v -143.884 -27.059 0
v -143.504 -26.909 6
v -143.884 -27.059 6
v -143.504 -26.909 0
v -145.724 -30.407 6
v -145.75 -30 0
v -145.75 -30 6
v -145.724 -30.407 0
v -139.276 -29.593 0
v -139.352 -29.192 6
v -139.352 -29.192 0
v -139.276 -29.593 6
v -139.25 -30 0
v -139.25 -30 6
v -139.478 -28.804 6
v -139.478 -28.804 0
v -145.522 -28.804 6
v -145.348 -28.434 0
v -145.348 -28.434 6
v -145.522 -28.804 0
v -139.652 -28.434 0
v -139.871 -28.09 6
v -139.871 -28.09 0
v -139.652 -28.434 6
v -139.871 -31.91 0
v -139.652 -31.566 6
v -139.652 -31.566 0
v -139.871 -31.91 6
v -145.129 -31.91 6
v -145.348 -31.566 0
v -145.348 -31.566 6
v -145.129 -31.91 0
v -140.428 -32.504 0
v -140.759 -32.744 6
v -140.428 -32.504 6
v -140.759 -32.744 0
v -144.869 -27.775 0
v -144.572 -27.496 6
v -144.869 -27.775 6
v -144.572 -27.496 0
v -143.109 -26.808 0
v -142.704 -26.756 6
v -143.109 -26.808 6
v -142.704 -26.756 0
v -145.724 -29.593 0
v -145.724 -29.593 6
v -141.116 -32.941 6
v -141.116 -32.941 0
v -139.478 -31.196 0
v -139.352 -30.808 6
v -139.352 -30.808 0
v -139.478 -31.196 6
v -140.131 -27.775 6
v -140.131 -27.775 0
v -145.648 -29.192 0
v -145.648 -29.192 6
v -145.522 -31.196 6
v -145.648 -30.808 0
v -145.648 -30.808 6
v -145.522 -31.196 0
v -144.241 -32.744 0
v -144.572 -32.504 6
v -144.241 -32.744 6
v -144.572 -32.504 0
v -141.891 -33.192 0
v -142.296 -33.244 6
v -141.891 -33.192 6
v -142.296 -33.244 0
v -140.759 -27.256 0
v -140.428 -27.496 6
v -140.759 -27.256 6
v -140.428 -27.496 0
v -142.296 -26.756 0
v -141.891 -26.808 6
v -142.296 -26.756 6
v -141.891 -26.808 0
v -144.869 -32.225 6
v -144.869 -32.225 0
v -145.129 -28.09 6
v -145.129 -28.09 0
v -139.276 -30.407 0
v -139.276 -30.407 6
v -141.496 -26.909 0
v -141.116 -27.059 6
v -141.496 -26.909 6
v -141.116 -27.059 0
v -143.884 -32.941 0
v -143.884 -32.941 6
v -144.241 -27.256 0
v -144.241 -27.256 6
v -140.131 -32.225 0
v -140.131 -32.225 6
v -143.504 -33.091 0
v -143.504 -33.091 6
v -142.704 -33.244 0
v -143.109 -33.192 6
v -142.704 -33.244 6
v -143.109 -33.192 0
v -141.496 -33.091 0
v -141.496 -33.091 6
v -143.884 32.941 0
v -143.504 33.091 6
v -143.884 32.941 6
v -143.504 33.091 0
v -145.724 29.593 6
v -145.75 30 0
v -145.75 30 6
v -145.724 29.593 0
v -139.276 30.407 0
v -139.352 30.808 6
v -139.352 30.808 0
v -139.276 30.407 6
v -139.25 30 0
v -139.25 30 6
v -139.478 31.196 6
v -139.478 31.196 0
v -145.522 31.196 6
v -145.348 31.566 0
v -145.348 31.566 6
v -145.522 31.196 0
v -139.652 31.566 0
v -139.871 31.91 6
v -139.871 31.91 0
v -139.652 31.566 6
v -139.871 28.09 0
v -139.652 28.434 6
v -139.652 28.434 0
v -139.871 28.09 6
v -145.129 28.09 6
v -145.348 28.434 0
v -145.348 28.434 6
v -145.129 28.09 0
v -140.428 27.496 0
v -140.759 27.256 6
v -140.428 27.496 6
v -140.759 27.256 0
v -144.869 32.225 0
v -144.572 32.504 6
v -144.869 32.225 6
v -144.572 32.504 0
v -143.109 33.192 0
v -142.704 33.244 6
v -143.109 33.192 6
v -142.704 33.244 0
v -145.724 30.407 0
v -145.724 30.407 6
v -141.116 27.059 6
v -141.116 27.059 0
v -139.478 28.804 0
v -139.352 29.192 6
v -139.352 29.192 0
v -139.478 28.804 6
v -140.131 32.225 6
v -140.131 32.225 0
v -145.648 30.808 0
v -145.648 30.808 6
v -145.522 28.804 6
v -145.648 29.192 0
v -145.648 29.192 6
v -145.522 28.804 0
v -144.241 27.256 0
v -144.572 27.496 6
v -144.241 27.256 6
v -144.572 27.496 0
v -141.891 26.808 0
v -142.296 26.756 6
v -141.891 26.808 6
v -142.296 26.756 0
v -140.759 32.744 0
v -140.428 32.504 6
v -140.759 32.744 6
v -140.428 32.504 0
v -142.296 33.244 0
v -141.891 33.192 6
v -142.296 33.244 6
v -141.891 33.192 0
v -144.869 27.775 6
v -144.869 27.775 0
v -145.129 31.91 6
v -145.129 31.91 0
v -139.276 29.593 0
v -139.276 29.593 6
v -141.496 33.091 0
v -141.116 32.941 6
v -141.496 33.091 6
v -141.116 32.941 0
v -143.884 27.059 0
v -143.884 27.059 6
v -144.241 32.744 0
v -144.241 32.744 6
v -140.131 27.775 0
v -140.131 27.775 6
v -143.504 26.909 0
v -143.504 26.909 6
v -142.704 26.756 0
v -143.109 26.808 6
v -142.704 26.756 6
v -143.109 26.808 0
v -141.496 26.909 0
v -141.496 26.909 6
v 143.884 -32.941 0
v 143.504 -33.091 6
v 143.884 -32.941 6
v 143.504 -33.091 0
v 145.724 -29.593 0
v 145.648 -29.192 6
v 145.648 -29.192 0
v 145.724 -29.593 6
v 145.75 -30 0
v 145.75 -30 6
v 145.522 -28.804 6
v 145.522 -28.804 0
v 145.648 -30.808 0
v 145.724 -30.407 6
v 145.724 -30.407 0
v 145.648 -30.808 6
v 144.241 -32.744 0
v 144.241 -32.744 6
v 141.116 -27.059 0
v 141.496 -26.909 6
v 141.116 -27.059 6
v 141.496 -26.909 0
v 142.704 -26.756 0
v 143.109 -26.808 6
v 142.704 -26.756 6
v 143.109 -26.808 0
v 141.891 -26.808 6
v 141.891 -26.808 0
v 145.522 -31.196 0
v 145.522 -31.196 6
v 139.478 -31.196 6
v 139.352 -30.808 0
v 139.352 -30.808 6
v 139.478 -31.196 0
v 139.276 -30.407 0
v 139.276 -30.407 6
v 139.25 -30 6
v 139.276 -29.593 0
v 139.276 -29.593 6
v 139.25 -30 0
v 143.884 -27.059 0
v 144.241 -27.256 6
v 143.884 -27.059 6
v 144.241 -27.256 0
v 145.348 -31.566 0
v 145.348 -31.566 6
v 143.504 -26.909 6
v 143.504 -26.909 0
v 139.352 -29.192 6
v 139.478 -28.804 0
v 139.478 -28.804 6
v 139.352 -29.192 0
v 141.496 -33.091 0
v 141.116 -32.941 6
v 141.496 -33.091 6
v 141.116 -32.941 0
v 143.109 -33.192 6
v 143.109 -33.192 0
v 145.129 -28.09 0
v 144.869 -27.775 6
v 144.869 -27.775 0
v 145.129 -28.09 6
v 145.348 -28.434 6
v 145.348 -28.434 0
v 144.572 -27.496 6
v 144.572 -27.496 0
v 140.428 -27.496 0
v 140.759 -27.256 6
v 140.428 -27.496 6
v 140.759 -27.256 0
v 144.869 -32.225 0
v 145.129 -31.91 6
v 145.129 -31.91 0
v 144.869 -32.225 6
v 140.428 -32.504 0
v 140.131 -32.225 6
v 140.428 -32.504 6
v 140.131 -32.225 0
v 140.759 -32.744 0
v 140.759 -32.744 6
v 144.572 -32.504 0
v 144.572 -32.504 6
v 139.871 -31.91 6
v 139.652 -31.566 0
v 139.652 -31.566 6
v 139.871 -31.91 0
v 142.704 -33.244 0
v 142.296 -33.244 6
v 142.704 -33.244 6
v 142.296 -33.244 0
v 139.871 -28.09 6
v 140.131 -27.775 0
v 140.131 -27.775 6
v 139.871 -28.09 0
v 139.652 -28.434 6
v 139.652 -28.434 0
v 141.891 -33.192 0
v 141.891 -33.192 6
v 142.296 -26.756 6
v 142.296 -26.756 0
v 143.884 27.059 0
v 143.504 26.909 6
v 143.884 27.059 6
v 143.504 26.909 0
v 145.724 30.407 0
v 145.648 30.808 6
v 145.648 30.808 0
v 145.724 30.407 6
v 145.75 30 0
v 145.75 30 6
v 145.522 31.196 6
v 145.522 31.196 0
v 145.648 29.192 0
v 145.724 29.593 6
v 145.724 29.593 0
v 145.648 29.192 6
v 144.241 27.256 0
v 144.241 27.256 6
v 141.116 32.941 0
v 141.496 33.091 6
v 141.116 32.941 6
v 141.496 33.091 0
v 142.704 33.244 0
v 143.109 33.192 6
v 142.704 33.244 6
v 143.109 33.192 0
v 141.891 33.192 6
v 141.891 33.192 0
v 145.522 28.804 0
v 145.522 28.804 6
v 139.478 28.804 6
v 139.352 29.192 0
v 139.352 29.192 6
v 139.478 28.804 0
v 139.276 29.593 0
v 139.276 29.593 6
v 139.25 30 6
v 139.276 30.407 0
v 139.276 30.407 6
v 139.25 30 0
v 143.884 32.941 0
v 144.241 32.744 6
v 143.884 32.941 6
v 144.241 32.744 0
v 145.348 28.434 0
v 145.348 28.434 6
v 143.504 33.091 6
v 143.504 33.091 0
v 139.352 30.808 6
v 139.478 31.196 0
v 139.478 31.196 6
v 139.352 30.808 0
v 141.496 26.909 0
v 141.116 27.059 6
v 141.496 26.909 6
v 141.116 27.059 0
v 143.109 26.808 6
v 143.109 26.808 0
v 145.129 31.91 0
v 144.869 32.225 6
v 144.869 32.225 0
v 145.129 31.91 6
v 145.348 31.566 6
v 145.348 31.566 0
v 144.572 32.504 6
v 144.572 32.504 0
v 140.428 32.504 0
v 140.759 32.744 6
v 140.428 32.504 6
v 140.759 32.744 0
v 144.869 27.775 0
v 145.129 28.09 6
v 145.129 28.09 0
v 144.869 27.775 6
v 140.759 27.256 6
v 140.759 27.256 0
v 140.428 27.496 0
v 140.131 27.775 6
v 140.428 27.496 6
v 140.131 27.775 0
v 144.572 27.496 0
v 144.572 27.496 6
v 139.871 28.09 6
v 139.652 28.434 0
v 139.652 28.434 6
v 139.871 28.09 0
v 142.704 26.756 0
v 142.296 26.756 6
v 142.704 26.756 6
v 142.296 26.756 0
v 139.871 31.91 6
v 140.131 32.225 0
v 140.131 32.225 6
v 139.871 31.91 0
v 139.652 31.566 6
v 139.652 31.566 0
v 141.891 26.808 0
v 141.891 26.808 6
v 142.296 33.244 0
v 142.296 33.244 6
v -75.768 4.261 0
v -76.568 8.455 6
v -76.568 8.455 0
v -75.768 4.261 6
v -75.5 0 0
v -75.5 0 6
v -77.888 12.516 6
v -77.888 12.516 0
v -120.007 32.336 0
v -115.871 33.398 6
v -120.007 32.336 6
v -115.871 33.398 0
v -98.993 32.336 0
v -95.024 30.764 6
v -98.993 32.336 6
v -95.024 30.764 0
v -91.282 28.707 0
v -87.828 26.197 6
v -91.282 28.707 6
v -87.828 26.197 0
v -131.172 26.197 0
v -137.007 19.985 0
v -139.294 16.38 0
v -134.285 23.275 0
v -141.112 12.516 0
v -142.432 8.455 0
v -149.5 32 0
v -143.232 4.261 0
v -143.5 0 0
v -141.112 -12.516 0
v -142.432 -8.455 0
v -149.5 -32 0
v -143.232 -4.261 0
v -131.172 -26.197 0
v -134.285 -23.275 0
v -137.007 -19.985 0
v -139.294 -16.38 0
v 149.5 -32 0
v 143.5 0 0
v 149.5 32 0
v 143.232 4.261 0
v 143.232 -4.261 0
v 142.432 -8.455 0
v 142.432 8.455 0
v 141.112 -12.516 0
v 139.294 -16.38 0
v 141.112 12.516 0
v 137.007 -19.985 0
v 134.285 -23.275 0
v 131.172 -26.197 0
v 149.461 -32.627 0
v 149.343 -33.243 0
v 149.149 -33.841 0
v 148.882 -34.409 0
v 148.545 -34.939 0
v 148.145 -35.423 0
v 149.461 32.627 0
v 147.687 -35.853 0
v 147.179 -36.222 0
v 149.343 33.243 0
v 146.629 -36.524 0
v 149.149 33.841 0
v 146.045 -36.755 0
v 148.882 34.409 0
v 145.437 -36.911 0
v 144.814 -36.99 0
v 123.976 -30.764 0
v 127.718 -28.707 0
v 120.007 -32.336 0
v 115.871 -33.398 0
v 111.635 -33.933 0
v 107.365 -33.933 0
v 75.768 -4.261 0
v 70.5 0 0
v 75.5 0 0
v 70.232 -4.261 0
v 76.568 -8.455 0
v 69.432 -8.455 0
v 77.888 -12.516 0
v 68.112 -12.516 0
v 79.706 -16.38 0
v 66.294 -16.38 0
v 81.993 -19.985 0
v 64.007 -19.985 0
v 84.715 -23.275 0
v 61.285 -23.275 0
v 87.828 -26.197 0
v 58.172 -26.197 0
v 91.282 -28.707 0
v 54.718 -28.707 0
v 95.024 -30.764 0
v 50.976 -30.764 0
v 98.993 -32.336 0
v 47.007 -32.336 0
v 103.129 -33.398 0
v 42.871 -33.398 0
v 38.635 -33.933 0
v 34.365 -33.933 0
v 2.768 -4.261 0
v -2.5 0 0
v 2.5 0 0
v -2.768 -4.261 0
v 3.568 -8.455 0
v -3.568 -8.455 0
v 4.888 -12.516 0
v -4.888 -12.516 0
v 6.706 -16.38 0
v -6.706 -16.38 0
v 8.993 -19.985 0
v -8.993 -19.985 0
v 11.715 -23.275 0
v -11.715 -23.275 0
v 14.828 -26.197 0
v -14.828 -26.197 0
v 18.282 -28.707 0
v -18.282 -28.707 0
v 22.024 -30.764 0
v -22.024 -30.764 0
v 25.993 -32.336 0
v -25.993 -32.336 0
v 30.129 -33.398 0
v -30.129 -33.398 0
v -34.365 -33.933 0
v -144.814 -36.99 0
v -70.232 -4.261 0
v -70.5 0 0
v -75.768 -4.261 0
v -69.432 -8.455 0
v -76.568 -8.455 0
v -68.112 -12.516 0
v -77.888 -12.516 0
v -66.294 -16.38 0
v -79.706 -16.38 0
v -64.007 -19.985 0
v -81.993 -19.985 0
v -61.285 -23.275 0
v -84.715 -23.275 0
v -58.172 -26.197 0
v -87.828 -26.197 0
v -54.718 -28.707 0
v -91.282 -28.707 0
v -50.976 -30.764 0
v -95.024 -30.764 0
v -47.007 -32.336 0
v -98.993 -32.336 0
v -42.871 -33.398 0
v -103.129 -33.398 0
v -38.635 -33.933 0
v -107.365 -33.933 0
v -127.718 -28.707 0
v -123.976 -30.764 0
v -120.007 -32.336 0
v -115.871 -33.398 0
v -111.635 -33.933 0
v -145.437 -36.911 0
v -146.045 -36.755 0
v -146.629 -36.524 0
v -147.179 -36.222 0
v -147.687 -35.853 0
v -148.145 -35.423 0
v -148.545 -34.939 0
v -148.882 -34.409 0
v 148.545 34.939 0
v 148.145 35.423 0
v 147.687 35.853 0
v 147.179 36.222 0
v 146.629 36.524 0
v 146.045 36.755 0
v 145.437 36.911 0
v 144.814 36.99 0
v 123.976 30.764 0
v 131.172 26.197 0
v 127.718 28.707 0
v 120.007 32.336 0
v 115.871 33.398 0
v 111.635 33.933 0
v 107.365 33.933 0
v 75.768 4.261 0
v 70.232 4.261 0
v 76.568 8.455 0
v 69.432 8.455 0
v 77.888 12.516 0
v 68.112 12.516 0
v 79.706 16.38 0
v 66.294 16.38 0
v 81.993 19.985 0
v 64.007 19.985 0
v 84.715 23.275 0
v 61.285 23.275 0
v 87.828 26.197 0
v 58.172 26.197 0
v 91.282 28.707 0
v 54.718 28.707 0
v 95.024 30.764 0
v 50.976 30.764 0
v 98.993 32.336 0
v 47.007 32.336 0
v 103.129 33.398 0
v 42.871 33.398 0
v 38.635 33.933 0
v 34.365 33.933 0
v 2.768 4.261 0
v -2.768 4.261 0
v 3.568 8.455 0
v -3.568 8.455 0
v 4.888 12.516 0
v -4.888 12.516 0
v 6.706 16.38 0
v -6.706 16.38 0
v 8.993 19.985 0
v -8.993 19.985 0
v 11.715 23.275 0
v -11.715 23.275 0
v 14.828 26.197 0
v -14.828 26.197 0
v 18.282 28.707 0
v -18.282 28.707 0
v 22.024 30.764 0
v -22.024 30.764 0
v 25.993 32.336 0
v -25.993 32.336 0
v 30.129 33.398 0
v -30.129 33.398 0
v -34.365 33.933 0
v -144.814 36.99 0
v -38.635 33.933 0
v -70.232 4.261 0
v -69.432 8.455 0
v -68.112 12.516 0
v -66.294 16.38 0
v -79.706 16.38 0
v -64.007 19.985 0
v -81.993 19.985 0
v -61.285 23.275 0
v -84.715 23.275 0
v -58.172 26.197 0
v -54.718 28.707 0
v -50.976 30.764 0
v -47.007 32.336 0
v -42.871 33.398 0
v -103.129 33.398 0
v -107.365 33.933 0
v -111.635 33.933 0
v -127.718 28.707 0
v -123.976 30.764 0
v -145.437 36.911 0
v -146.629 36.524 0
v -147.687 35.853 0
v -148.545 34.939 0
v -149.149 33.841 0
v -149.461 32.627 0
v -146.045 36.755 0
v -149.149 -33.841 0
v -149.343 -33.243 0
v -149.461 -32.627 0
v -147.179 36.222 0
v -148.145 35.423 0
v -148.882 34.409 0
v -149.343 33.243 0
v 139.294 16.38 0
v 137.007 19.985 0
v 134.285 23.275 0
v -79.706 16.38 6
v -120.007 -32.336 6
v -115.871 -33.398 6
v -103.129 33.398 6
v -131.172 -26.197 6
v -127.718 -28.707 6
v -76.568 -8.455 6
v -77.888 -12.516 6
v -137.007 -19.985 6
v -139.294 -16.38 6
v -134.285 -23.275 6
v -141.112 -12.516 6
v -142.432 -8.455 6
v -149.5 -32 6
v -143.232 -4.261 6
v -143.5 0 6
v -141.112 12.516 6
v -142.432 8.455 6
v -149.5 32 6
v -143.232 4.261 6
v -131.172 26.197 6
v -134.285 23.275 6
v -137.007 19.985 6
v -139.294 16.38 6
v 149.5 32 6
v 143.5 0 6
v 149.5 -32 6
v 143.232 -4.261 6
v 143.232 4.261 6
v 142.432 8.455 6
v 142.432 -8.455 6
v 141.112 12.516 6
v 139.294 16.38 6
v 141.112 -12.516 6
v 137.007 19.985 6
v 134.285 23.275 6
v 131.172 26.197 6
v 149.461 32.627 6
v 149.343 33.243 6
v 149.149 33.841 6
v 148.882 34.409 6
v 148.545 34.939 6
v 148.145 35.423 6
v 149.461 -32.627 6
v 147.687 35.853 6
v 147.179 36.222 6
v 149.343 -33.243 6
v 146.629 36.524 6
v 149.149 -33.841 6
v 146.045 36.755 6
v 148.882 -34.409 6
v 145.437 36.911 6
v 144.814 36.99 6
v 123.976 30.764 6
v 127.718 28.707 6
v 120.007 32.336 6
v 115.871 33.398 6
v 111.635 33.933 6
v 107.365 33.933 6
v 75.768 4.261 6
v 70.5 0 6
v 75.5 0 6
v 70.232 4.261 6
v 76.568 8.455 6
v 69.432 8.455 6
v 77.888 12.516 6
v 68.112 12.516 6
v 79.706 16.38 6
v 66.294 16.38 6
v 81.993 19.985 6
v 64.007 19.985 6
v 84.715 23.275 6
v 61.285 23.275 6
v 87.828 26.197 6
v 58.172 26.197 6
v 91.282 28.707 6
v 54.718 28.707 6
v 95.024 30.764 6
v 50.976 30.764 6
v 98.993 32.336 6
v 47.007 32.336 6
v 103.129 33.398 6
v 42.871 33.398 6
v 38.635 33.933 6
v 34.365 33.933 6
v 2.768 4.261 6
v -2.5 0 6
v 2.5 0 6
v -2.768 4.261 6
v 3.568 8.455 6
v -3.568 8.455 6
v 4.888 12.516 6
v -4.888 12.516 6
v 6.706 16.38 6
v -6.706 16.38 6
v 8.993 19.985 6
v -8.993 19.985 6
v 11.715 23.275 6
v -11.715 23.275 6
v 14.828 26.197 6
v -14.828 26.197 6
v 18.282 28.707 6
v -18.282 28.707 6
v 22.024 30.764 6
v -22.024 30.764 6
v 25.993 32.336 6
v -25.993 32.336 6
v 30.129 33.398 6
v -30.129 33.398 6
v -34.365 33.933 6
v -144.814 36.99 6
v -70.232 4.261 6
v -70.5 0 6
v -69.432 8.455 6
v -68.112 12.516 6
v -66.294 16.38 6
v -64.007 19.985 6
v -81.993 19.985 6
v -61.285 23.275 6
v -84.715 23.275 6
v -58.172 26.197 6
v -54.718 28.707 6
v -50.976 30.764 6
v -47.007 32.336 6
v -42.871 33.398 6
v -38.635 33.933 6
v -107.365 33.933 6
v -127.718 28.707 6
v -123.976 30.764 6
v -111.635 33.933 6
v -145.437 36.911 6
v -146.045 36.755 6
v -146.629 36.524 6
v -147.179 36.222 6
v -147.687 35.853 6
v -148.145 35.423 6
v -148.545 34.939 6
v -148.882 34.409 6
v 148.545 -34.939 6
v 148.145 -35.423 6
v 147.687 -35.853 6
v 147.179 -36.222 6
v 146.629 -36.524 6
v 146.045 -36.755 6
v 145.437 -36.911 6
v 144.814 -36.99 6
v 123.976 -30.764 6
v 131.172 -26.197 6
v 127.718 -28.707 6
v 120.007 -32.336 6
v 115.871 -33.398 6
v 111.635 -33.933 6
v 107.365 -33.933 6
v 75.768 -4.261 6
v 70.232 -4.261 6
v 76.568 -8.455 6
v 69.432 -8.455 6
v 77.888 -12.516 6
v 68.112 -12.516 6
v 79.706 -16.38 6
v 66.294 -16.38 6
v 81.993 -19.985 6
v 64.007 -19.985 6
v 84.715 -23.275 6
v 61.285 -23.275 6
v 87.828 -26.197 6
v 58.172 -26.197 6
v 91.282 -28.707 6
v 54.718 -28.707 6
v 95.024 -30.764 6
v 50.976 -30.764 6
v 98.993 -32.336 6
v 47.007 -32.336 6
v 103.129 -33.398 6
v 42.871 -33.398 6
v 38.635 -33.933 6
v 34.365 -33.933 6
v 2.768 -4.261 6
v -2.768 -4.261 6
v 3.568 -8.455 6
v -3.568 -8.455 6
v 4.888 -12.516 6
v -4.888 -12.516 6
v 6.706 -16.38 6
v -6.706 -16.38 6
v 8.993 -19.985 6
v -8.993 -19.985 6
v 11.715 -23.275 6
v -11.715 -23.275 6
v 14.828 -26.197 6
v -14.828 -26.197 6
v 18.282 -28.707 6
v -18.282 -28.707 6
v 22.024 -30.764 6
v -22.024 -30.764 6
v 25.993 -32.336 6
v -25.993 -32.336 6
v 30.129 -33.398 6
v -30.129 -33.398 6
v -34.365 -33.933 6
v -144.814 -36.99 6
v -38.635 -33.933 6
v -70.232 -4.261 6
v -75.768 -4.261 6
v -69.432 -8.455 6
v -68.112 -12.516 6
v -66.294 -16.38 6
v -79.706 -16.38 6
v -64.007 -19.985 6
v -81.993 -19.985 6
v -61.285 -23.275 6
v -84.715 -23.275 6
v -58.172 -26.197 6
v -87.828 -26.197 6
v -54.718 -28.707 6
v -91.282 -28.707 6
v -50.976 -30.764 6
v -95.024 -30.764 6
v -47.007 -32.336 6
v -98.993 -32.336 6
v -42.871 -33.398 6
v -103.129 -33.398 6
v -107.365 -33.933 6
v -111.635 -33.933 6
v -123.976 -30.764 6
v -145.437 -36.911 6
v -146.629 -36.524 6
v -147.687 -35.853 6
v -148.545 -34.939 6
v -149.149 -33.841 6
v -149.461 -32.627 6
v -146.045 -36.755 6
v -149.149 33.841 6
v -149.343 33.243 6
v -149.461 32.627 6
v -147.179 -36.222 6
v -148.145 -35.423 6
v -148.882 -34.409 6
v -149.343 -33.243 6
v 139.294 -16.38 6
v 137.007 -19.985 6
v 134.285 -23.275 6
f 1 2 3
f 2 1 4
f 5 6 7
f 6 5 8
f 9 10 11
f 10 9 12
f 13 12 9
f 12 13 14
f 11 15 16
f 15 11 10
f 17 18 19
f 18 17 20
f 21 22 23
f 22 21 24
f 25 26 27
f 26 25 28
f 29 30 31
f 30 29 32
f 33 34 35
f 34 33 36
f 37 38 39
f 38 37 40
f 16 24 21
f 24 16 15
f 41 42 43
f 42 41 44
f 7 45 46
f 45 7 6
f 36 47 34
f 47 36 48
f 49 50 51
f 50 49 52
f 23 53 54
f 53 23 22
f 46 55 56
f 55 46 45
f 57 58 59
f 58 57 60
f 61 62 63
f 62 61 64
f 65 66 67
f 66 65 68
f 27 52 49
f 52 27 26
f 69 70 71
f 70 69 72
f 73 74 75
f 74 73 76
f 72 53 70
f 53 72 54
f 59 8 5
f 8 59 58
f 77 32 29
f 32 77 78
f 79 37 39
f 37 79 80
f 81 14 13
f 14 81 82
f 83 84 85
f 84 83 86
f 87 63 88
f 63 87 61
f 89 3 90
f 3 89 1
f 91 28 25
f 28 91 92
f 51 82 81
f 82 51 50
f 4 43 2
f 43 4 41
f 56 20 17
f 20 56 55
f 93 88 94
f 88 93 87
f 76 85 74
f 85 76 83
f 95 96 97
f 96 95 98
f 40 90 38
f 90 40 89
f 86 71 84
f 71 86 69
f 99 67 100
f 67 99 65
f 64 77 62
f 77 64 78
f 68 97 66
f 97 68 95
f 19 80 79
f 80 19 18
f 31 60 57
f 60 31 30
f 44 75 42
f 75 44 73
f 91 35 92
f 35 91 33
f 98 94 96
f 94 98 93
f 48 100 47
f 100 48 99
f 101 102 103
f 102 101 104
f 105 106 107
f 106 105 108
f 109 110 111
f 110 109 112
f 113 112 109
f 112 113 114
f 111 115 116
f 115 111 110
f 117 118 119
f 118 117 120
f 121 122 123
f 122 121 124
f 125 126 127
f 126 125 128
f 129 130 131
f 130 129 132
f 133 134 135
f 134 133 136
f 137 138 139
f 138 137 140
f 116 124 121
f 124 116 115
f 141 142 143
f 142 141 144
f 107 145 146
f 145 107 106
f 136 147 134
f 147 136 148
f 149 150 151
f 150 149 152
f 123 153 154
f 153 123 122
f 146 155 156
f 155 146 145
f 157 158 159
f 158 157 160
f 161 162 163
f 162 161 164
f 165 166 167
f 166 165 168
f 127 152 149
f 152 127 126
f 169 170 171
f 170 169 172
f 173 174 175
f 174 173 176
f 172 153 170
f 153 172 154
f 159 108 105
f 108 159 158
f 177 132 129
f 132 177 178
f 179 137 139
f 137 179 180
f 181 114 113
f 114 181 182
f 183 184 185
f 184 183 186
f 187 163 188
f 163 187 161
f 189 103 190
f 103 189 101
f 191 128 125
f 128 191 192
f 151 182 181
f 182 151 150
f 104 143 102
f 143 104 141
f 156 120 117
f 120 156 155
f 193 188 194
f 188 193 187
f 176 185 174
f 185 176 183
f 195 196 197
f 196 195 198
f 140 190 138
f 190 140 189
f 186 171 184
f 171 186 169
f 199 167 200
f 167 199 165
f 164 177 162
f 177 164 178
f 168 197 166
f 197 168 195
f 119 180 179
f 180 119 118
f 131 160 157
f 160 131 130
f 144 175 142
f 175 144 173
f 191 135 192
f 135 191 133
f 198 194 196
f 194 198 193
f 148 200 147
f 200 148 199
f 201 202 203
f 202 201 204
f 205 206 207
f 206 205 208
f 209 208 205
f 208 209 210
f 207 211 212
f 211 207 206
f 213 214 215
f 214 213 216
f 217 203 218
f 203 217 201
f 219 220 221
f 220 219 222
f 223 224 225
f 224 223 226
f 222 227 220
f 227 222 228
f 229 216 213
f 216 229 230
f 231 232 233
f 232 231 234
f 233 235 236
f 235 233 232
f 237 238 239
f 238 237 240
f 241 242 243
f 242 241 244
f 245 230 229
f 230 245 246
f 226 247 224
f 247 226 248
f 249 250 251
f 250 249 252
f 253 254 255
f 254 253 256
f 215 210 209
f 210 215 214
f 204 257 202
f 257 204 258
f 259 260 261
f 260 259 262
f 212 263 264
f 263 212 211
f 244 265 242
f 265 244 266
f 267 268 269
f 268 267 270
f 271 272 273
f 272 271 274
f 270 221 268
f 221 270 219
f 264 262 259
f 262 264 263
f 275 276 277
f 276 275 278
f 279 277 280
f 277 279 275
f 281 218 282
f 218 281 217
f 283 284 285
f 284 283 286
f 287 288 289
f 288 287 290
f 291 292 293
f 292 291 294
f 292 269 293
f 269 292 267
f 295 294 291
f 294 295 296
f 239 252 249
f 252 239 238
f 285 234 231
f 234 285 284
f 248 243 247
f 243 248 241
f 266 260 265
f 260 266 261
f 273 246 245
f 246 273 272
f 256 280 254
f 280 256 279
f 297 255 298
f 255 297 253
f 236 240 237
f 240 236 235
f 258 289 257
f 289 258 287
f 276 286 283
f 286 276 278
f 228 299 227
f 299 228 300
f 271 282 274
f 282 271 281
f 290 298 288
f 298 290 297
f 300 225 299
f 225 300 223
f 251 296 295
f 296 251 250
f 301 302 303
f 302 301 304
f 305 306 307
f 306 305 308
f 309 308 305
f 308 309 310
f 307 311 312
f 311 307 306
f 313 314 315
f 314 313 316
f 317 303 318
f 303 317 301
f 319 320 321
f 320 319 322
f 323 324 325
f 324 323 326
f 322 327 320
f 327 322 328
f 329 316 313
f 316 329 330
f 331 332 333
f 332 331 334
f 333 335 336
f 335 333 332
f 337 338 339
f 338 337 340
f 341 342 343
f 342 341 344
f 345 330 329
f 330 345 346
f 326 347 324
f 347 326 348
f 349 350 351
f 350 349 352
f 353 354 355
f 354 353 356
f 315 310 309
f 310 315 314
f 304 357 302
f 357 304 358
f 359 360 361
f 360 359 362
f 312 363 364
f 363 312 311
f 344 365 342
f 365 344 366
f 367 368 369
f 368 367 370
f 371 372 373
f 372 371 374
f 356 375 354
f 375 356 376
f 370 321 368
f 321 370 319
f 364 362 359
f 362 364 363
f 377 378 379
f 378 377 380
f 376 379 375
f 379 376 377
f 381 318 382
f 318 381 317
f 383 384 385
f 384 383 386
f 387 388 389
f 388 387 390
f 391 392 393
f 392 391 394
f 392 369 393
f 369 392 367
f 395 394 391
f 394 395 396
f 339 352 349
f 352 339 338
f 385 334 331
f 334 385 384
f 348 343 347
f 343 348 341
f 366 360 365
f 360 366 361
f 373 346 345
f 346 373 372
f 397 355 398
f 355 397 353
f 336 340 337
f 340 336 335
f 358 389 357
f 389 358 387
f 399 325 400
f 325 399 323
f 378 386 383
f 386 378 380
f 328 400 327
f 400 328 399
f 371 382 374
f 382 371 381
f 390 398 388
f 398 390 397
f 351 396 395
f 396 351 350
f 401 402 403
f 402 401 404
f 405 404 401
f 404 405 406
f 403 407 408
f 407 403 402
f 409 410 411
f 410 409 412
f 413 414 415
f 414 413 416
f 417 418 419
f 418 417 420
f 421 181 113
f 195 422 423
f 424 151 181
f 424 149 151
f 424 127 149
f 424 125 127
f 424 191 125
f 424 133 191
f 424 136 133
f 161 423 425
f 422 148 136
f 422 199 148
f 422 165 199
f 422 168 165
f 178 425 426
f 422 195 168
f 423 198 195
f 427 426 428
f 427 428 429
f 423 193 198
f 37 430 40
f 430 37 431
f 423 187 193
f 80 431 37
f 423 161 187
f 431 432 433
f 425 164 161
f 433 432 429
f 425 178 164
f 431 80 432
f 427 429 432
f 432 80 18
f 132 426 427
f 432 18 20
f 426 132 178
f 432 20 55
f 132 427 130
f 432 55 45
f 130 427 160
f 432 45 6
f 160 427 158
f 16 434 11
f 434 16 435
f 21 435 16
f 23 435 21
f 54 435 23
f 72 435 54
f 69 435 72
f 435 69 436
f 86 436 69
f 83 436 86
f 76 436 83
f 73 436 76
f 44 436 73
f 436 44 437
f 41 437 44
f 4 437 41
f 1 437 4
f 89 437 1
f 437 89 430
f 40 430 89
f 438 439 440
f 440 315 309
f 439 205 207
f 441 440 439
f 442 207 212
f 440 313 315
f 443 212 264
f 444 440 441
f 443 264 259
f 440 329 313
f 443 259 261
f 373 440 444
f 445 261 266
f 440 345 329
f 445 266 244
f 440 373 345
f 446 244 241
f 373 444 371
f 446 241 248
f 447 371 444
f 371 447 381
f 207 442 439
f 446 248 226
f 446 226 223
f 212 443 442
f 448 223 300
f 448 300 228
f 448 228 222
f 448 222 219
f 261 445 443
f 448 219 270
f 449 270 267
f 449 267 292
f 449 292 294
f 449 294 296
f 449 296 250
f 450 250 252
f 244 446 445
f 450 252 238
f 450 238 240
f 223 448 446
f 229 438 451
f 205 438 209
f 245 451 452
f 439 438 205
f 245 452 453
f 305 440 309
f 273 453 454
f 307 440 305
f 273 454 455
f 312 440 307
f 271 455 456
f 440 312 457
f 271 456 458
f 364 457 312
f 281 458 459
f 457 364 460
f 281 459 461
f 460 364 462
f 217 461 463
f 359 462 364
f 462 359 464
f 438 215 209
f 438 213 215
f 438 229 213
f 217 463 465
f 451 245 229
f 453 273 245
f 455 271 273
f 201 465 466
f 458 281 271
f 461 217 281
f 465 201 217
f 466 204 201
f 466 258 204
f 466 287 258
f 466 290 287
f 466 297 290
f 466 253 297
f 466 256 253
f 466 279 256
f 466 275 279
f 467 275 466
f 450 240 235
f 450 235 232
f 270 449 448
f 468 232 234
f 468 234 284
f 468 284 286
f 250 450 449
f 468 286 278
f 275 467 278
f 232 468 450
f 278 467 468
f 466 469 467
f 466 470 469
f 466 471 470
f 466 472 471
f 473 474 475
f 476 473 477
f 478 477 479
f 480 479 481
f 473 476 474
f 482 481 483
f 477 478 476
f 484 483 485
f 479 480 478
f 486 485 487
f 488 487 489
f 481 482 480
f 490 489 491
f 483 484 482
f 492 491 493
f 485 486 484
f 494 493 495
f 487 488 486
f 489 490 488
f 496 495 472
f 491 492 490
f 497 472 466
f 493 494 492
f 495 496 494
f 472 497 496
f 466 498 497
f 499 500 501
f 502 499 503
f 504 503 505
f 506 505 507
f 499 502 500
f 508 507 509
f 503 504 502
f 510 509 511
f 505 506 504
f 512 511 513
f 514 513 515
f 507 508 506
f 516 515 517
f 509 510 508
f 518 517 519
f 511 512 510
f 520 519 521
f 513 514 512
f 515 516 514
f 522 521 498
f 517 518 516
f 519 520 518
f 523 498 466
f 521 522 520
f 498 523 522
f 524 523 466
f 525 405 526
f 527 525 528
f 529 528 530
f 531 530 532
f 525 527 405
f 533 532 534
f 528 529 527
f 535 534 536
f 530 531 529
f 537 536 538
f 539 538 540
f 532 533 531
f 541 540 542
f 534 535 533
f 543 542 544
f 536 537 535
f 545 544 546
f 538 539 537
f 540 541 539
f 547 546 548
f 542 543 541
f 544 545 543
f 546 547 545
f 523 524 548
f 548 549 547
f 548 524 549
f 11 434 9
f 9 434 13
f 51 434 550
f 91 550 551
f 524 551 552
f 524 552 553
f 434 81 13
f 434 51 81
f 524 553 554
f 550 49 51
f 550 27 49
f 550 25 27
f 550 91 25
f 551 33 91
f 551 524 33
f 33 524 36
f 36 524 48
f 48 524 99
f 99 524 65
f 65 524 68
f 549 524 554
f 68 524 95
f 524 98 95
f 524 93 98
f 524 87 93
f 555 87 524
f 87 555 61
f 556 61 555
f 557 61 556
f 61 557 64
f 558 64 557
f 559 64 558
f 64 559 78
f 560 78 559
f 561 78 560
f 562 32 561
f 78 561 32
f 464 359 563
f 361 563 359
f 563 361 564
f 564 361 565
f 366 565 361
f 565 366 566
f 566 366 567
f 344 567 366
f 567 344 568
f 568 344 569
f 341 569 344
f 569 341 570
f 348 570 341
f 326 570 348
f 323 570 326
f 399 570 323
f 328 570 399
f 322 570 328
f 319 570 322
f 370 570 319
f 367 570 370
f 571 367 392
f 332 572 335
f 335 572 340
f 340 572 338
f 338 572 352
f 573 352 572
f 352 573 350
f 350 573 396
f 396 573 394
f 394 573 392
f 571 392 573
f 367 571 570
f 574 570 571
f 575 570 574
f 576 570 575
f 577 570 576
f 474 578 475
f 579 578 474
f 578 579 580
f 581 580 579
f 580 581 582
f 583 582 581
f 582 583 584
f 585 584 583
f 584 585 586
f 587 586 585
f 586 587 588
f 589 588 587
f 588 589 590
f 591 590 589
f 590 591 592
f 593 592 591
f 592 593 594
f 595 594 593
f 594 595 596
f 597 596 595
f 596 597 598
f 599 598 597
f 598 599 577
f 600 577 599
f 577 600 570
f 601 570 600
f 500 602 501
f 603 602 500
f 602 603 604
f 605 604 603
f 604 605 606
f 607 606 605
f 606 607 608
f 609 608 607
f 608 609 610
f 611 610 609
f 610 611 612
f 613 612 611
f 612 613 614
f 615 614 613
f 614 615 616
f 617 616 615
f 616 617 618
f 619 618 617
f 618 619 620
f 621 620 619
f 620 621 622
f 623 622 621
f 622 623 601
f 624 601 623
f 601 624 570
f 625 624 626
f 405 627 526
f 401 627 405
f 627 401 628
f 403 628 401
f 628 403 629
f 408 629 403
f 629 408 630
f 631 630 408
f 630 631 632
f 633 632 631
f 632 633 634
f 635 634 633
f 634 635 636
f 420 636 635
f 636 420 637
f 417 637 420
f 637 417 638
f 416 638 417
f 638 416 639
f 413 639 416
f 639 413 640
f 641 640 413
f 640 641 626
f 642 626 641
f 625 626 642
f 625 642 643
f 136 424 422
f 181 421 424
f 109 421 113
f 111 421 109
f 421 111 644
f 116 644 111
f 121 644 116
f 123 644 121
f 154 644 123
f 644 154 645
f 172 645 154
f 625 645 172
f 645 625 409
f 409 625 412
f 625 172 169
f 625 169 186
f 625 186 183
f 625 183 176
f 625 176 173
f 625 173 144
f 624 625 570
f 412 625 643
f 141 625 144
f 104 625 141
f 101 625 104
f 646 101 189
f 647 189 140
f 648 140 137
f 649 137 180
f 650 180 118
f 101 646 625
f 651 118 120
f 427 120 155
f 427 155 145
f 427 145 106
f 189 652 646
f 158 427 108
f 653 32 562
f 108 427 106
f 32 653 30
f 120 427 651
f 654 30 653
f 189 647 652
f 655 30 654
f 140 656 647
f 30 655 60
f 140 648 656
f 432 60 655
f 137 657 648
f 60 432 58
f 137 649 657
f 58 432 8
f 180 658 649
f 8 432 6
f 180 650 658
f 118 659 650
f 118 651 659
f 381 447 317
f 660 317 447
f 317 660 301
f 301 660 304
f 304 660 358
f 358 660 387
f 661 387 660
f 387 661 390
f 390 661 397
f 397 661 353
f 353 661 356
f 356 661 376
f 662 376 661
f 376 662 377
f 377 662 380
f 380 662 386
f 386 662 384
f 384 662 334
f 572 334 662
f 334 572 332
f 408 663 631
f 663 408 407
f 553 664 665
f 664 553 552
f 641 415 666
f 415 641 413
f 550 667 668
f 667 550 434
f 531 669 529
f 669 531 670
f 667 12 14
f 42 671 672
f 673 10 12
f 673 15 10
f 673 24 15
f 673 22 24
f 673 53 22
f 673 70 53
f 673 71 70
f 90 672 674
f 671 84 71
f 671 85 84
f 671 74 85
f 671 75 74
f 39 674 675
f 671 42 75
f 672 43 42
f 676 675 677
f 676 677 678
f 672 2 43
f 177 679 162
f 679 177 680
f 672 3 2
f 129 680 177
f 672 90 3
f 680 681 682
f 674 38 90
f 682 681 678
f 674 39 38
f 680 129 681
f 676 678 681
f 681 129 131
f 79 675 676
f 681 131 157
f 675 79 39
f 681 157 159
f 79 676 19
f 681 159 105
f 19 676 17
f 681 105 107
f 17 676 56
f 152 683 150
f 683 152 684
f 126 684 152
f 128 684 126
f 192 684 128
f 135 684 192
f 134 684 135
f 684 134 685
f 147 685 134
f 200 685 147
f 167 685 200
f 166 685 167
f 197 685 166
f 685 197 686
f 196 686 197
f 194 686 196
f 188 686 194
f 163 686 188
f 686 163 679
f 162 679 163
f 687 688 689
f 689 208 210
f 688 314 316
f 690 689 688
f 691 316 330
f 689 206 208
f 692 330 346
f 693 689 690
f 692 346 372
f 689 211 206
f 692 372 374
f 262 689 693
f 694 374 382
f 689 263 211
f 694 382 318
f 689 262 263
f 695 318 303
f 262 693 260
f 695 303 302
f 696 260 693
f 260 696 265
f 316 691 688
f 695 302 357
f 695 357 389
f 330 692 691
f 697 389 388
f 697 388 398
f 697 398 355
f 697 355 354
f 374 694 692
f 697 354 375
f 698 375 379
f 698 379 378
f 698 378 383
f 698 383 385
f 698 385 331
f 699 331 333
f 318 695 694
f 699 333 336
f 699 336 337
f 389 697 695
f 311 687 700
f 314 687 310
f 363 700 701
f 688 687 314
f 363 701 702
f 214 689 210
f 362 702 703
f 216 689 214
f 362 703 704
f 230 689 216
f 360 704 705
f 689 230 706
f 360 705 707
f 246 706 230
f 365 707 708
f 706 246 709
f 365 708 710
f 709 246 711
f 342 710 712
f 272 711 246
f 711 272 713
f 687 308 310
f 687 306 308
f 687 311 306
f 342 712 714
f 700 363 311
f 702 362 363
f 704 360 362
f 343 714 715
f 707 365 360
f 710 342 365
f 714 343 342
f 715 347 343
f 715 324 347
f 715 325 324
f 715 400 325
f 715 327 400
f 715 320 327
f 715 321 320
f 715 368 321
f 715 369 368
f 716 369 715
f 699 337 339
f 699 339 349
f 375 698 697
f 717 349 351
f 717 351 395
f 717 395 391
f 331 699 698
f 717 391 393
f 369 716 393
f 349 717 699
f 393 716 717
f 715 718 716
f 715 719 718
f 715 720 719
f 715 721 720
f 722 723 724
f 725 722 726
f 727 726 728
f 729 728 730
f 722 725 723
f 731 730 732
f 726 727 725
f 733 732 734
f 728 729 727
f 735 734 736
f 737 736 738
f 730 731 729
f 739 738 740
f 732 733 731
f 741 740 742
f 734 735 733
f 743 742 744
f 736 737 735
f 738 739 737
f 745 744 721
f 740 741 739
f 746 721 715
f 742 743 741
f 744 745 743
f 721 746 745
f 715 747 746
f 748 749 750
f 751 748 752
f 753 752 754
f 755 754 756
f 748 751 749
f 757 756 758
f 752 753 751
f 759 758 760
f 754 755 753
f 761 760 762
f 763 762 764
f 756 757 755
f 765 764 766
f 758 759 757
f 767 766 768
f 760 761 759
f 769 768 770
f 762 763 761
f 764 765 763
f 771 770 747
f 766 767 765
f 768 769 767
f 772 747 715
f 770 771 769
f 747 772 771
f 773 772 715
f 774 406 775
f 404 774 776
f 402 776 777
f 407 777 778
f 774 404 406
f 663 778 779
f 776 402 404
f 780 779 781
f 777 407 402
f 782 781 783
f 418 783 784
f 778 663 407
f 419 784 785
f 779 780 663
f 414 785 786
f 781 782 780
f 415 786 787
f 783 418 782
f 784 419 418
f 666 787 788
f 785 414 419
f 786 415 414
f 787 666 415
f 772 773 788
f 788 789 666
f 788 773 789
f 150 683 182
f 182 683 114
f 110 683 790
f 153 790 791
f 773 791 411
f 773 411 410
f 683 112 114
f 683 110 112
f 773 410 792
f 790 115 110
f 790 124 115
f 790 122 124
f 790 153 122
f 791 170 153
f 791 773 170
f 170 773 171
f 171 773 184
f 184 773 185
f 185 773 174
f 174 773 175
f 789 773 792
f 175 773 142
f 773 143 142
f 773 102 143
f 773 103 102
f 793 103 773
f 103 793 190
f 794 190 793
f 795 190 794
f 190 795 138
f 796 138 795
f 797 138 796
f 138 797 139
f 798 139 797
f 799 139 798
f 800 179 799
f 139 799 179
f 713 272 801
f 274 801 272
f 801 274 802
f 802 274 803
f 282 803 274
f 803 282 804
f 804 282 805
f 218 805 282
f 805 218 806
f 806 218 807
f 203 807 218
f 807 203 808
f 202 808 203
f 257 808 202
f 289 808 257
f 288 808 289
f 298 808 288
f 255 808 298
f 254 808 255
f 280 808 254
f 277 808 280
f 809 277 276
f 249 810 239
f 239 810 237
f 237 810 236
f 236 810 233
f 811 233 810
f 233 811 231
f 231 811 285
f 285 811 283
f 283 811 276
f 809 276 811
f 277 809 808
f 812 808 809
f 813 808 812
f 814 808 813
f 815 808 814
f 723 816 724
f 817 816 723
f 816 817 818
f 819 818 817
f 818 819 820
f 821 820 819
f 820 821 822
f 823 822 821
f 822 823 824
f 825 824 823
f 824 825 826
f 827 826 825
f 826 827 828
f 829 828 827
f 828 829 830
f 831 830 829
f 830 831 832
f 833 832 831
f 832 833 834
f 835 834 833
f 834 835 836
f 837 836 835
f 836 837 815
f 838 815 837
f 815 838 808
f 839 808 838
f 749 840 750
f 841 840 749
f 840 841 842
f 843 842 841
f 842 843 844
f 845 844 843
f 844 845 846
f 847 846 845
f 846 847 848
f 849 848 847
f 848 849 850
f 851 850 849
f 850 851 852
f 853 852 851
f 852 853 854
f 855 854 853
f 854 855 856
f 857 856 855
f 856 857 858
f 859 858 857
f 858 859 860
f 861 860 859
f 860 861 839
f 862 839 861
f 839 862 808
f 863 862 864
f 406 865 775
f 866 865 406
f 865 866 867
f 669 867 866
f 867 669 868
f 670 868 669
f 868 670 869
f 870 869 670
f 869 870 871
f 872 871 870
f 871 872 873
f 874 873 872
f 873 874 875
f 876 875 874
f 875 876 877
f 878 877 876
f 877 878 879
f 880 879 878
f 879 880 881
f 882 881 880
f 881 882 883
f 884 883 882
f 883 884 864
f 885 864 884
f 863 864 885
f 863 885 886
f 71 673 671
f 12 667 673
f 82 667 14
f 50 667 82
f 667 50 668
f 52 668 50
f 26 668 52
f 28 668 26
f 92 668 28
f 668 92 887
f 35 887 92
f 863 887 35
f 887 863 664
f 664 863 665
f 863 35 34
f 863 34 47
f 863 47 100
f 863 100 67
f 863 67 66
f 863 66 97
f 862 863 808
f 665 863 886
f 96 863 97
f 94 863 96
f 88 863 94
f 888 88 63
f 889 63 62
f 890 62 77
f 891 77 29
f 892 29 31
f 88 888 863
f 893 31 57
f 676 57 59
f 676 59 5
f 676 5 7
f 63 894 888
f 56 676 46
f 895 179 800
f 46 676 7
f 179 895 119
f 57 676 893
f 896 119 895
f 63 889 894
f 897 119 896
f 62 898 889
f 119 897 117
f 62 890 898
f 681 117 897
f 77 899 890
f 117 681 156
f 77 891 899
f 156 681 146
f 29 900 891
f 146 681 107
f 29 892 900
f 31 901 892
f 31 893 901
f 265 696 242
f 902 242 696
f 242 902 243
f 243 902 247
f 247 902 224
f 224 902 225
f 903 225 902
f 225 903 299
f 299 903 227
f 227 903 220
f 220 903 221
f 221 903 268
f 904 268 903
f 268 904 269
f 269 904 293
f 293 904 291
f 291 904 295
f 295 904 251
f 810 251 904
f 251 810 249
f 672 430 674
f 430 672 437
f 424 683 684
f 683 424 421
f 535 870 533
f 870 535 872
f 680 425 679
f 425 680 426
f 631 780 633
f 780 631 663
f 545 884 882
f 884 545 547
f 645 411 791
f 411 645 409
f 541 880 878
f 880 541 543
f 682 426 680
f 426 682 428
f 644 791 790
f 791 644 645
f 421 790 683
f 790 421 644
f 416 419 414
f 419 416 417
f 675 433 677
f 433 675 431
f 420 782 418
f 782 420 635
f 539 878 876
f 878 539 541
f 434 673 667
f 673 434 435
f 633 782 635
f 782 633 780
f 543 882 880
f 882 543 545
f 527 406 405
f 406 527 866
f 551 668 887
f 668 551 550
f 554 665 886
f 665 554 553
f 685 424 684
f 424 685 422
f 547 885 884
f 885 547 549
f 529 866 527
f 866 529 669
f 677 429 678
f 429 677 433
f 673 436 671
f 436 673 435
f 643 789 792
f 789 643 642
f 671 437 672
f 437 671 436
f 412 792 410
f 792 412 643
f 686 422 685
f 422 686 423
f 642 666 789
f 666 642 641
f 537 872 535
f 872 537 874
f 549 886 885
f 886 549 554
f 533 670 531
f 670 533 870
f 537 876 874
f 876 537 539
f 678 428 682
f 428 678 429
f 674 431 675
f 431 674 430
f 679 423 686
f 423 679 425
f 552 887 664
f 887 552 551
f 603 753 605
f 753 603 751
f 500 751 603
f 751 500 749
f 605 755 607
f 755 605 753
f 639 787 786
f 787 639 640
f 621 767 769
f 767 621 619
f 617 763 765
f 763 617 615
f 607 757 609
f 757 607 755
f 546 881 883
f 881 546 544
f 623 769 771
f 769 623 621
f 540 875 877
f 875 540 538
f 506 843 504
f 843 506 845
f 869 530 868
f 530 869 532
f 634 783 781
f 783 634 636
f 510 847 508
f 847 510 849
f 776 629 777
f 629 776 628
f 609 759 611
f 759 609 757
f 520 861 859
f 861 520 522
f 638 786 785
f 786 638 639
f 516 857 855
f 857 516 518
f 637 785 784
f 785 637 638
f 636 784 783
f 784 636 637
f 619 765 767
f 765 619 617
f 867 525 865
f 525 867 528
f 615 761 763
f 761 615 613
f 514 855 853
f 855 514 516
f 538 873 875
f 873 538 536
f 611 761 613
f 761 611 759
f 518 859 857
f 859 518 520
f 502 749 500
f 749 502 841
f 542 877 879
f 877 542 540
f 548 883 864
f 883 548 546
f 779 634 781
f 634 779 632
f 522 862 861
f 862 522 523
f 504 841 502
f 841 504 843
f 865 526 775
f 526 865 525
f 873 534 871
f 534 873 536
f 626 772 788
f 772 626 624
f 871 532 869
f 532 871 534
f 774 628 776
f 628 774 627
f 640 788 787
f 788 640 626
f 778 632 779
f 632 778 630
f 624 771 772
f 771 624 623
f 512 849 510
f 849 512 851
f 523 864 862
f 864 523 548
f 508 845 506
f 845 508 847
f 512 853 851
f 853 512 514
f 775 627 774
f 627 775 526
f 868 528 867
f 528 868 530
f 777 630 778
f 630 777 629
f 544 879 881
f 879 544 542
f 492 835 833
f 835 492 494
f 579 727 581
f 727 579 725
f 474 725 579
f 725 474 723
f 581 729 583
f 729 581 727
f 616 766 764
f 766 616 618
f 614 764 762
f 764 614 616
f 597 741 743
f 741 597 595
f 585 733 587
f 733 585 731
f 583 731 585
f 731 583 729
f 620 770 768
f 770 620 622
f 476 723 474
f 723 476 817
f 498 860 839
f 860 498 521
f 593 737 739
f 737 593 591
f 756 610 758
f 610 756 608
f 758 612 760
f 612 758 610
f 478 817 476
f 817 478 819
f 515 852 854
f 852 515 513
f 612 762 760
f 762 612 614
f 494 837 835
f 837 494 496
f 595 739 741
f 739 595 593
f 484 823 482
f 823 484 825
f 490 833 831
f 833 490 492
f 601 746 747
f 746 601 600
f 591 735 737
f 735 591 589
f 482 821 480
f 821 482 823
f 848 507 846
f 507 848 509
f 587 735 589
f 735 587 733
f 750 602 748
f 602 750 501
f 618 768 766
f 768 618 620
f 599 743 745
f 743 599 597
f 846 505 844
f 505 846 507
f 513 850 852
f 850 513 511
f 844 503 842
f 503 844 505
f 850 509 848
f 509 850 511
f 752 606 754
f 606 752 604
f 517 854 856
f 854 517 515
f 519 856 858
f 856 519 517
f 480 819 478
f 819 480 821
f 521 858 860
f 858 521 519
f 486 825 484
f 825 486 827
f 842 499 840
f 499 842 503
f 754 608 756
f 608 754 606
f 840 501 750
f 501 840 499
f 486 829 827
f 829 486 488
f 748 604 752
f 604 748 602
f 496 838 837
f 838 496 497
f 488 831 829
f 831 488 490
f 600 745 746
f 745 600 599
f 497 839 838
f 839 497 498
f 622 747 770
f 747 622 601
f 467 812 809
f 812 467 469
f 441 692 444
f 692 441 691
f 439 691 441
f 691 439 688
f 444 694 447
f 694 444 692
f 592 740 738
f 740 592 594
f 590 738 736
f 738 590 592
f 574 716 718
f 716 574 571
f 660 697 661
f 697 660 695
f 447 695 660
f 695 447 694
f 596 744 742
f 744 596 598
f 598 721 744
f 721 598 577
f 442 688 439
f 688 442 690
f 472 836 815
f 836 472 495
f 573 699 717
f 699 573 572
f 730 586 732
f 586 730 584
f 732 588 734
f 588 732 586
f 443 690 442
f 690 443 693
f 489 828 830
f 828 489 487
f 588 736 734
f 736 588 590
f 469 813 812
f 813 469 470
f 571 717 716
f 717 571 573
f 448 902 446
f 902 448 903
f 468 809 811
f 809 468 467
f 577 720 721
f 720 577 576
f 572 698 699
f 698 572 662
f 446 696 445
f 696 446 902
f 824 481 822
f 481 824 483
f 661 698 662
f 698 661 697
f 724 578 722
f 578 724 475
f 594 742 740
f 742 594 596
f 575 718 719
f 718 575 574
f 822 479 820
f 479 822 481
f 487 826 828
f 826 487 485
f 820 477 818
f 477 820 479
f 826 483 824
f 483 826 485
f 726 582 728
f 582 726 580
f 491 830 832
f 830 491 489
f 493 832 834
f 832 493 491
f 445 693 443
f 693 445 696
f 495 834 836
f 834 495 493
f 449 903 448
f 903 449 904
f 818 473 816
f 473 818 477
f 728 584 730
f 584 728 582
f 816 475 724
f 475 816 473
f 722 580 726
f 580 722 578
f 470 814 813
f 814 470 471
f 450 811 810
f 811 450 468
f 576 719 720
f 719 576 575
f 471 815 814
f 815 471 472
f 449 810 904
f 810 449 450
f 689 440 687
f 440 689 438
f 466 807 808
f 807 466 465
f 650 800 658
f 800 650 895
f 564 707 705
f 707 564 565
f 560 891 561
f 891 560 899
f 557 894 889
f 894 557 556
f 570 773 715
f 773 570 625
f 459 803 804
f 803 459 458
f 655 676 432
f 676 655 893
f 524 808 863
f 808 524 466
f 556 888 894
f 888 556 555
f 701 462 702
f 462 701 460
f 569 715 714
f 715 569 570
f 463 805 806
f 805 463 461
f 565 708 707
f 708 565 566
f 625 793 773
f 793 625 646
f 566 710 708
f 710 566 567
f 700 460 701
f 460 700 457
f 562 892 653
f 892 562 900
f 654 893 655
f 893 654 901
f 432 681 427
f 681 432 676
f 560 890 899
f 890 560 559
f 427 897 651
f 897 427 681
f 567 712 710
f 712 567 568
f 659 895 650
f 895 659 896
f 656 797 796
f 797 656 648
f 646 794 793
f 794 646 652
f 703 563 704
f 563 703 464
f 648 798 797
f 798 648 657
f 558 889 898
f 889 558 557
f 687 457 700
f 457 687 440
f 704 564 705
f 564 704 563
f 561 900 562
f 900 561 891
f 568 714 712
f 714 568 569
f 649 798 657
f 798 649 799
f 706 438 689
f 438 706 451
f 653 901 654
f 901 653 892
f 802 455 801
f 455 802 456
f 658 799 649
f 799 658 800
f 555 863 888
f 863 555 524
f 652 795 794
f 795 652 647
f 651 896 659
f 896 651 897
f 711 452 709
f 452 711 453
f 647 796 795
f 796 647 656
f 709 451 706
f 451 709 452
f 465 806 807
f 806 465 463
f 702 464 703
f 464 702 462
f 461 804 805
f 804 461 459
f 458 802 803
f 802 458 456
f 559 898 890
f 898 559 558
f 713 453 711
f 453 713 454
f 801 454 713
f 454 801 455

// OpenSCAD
$fn = 50;

difference() {
	union() {
		hull() {
			translate(v = [-144.5, 32.0, 0]) {
				cylinder(h = 6, r = 5);
			}
			translate(v = [144.5, 32.0, 0]) {
				cylinder(h = 6, r = 5);
			}
			translate(v = [-144.5, -32.0, 0]) {
				cylinder(h = 6, r = 5);
			}
			translate(v = [144.5, -32.0, 0]) {
				cylinder(h = 6, r = 5);
			}
		}
	}
	union() {
		translate(v = [-142.5, -30.0, -100.0]) {
			cylinder(h = 200, r = 3.25);
		}
		translate(v = [-142.5, 30.0, -100.0]) {
			cylinder(h = 200, r = 3.25);
		}
		translate(v = [142.5, -30.0, -100.0]) {
			cylinder(h = 200, r = 3.25);
		}
		translate(v = [142.5, 30.0, -100.0]) {
			cylinder(h = 200, r = 3.25);
		}
		translate(v = [-142.5, -30.0, -100.0]) {
			cylinder(h = 200, r = 1.8);
		}
		translate(v = [-142.5, 30.0, -100.0]) {
			cylinder(h = 200, r = 1.8);
		}
		translate(v = [142.5, -30.0, -100.0]) {
			cylinder(h = 200, r = 1.8);
		}
		translate(v = [142.5, 30.0, -100.0]) {
			cylinder(h = 200, r = 1.8);
		}
		translate(v = [-109.5, 0, 0.0]) {
			cylinder(h = 6, r = 34.0);
		}
		translate(v = [-36.5, 0, 0.0]) {
			cylinder(h = 6, r = 34.0);
		}
		translate(v = [36.5, 0, 0.0]) {
			cylinder(h = 6, r = 34.0);
		}
		translate(v = [109.5, 0, 0.0]) {
			cylinder(h = 6, r = 34.0);
		}
	}
}
